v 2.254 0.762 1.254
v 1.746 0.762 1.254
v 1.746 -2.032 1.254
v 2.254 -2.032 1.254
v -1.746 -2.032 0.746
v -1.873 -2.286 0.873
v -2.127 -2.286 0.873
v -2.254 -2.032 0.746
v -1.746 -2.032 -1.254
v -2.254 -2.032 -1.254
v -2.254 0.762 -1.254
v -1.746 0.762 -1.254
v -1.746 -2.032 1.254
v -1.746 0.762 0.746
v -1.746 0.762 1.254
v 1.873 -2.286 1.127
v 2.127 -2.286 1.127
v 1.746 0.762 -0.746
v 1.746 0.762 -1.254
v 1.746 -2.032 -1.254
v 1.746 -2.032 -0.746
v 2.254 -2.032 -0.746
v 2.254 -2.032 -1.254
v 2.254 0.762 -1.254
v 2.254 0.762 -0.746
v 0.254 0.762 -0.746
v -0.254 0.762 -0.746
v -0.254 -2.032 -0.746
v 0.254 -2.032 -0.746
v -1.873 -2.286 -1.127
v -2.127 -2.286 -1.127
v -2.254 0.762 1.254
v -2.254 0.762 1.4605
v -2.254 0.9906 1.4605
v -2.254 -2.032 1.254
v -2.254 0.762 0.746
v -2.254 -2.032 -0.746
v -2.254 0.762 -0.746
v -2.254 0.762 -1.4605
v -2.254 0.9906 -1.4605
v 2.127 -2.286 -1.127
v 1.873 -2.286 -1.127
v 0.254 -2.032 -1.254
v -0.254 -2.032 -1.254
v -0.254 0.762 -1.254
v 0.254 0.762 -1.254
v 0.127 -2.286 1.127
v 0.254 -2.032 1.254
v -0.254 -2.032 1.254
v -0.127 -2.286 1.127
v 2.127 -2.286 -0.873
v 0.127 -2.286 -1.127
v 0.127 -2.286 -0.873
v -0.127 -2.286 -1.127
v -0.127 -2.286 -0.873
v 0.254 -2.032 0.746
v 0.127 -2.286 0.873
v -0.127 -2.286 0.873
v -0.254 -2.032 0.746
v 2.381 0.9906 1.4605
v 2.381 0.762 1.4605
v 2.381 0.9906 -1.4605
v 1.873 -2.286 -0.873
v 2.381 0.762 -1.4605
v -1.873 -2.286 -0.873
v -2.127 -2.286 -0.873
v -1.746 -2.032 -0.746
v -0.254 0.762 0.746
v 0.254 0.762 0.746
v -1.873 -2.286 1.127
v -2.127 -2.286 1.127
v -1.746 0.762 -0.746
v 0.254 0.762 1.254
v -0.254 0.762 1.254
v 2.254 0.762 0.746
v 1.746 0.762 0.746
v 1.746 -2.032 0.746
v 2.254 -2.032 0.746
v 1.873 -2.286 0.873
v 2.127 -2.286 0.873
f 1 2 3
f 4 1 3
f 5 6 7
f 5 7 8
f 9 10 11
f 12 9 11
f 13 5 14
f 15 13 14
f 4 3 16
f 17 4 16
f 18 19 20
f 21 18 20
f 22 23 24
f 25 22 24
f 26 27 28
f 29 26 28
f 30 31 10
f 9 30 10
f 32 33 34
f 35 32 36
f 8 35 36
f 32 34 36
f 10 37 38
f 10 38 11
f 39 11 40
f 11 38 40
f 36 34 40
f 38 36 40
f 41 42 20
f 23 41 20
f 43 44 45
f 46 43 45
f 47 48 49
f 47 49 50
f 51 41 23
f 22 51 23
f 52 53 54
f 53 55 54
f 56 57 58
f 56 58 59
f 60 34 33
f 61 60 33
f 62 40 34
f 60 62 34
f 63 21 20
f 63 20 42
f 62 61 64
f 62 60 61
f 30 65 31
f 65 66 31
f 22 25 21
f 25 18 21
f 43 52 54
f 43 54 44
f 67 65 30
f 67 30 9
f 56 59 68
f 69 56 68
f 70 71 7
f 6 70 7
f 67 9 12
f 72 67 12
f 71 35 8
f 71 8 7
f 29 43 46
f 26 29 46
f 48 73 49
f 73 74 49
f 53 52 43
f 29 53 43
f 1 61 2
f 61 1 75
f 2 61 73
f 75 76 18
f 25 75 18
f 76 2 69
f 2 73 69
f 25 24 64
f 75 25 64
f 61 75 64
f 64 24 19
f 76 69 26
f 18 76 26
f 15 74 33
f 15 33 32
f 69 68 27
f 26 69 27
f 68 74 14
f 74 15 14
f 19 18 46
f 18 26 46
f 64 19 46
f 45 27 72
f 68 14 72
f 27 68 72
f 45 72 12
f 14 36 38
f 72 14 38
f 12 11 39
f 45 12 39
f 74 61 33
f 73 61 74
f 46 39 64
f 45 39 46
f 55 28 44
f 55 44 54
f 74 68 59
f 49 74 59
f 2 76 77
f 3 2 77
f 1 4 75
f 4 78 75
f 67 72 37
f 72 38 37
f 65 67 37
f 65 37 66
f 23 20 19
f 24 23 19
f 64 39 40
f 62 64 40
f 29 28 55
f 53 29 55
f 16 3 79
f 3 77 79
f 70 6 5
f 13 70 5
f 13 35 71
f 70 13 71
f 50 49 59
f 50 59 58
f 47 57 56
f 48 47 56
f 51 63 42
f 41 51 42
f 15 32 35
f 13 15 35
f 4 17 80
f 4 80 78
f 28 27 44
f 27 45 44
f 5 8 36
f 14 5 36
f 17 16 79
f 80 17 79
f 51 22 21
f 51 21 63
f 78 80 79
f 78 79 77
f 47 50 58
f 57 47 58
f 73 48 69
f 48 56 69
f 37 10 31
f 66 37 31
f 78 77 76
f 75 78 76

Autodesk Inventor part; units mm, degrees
sketch "Sketch_2" plane through (-2.254, 0, 0) normal (1, 0, 0) x (0, 0, -1)
  line L0 (-1.4605, 0.762) -> (-1.254, 0.762)
  line L1 (-1.254, 0.762) -> (-1.254, -2.032)
  line L2 (-1.254, -2.032) -> (-1.127, -2.286)
  line L3 (-1.127, -2.286) -> (-0.873, -2.286)
  line L4 (-0.873, -2.286) -> (-0.746, -2.032)
  line L5 (-0.746, -2.032) -> (-0.746, 0.762)
  line L6 (-0.746, 0.762) -> (0.746, 0.762)
  line L7 (0.746, 0.762) -> (0.746, -2.032)
  line L8 (0.746, -2.032) -> (0.873, -2.286)
  line L9 (0.873, -2.286) -> (1.127, -2.286)
  line L10 (1.127, -2.286) -> (1.254, -2.032)
  line L11 (1.254, -2.032) -> (1.254, 0.762)
  line L12 (1.254, 0.762) -> (1.4605, 0.762)
  line L13 (1.4605, 0.762) -> (1.4605, 0.9906)
  line L14 (1.4605, 0.9906) -> (-1.4605, 0.9906)
  line L15 (-1.4605, 0.9906) -> (-1.4605, 0.762)
extrude "Extrusion1" add sketch "Sketch_2" along normal blind 4.635
sketch "Sketch_1" plane through (0, 0, 0) normal (0, 0, 1) x (1, 0, 0)
  line L0 (-109.4334, 38.1) -> (-109.4334, -38.1)
  line L1 (-109.4334, -38.1) -> (56.7986, -38.1)
  line L2 (56.7986, -38.1) -> (56.7986, 38.1)
  line L3 (56.7986, 38.1) -> (-109.4334, 38.1)
  line L4 (-100.4603, 0.762) -> (-100.2538, 0.762)
  line L5 (-100.2538, 0.762) -> (-100.2538, -2.032)
  line L6 (-100.2538, -2.032) -> (-100.1268, -2.286)
  line L7 (-100.1268, -2.286) -> (-99.8728, -2.286)
  line L8 (-99.8728, -2.286) -> (-99.7458, -2.032)
  line L9 (-99.7458, -2.032) -> (-99.7458, 0.762)
  line L10 (-99.7458, 0.762) -> (-98.2538, 0.762)
  line L11 (-98.2538, 0.762) -> (-98.2538, -2.032)
  line L12 (-98.2538, -2.032) -> (-98.1268, -2.286)
  line L13 (-98.1268, -2.286) -> (-97.8728, -2.286)
  line L14 (-97.8728, -2.286) -> (-97.7458, -2.032)
  line L15 (-97.7458, -2.032) -> (-97.7458, 0.762)
  line L16 (-97.7458, 0.762) -> (-96.2538, 0.762)
  line L17 (-96.2538, 0.762) -> (-96.2538, -2.032)
  line L18 (-96.2538, -2.032) -> (-96.1268, -2.286)
  line L19 (-96.1268, -2.286) -> (-95.8728, -2.286)
  line L20 (-95.8728, -2.286) -> (-95.7458, -2.032)
  line L21 (-95.7458, -2.032) -> (-95.7458, 0.762)
  line L22 (-95.7458, 0.762) -> (-94.2538, 0.762)
  line L23 (-94.2538, 0.762) -> (-94.2538, -2.032)
  line L24 (-94.2538, -2.032) -> (-94.1268, -2.286)
  line L25 (-94.1268, -2.286) -> (-93.8728, -2.286)
  line L26 (-93.8728, -2.286) -> (-93.7458, -2.032)
  line L27 (-93.7458, -2.032) -> (-93.7458, 0.762)
  line L28 (-93.7458, 0.762) -> (-92.2538, 0.762)
  line L29 (-92.2538, 0.762) -> (-92.2538, -2.032)
  line L30 (-92.2538, -2.032) -> (-92.1268, -2.286)
  line L31 (-92.1268, -2.286) -> (-91.8728, -2.286)
  line L32 (-91.8728, -2.286) -> (-91.7458, -2.032)
  line L33 (-91.7458, -2.032) -> (-91.7458, 0.762)
  line L34 (-91.7458, 0.762) -> (-90.2538, 0.762)
  line L35 (-90.2538, 0.762) -> (-90.2538, -2.032)
  line L36 (-90.2538, -2.032) -> (-90.1268, -2.286)
  line L37 (-90.1268, -2.286) -> (-89.8728, -2.286)
  line L38 (-89.8728, -2.286) -> (-89.7458, -2.032)
  line L39 (-89.7458, -2.032) -> (-89.7458, 0.762)
  line L40 (-89.7458, 0.762) -> (-88.2538, 0.762)
  line L41 (-88.2538, 0.762) -> (-88.2538, -2.032)
  line L42 (-88.2538, -2.032) -> (-88.1268, -2.286)
  line L43 (-88.1268, -2.286) -> (-87.8728, -2.286)
  line L44 (-87.8728, -2.286) -> (-87.7458, -2.032)
  line L45 (-87.7458, -2.032) -> (-87.7458, 0.762)
  line L46 (-87.7458, 0.762) -> (-86.2538, 0.762)
  line L47 (-86.2538, 0.762) -> (-86.2538, -2.032)
  line L48 (-86.2538, -2.032) -> (-86.1268, -2.286)
  line L49 (-86.1268, -2.286) -> (-85.8728, -2.286)
  line L50 (-85.8728, -2.286) -> (-85.7458, -2.032)
  line L51 (-85.7458, -2.032) -> (-85.7458, 0.762)
  line L52 (-85.7458, 0.762) -> (-84.2538, 0.762)
  line L53 (-84.2538, 0.762) -> (-84.2538, -2.032)
  line L54 (-84.2538, -2.032) -> (-84.1268, -2.286)
  line L55 (-84.1268, -2.286) -> (-83.8728, -2.286)
  line L56 (-83.8728, -2.286) -> (-83.7458, -2.032)
  line L57 (-83.7458, -2.032) -> (-83.7458, 0.762)
  line L58 (-83.7458, 0.762) -> (-82.2538, 0.762)
  line L59 (-82.2538, 0.762) -> (-82.2538, -2.032)
  line L60 (-82.2538, -2.032) -> (-82.1268, -2.286)
  line L61 (-82.1268, -2.286) -> (-81.8728, -2.286)
  line L62 (-81.8728, -2.286) -> (-81.7458, -2.032)
  line L63 (-81.7458, -2.032) -> (-81.7458, 0.762)
  line L64 (-81.7458, 0.762) -> (-80.2538, 0.762)
  line L65 (-80.2538, 0.762) -> (-80.2538, -2.032)
  line L66 (-80.2538, -2.032) -> (-80.1268, -2.286)
  line L67 (-80.1268, -2.286) -> (-79.8728, -2.286)
  line L68 (-79.8728, -2.286) -> (-79.7458, -2.032)
  line L69 (-79.7458, -2.032) -> (-79.7458, 0.762)
  line L70 (-79.7458, 0.762) -> (-78.2538, 0.762)
  line L71 (-78.2538, 0.762) -> (-78.2538, -2.032)
  line L72 (-78.2538, -2.032) -> (-78.1268, -2.286)
  line L73 (-78.1268, -2.286) -> (-77.8728, -2.286)
  line L74 (-77.8728, -2.286) -> (-77.7458, -2.032)
  line L75 (-77.7458, -2.032) -> (-77.7458, 0.762)
  line L76 (-77.7458, 0.762) -> (-76.2538, 0.762)
  line L77 (-76.2538, 0.762) -> (-76.2538, -2.032)
  line L78 (-76.2538, -2.032) -> (-76.1268, -2.286)
  line L79 (-76.1268, -2.286) -> (-75.8728, -2.286)
  line L80 (-75.8728, -2.286) -> (-75.7458, -2.032)
  line L81 (-75.7458, -2.032) -> (-75.7458, 0.762)
  line L82 (-75.7458, 0.762) -> (-74.2539, 0.762)
  line L83 (-74.2539, 0.762) -> (-74.2539, -2.032)
  line L84 (-74.2539, -2.032) -> (-74.1269, -2.286)
  line L85 (-74.1269, -2.286) -> (-73.8729, -2.286)
  line L86 (-73.8729, -2.286) -> (-73.7459, -2.032)
  line L87 (-73.7459, -2.032) -> (-73.7459, 0.762)
  line L88 (-73.7459, 0.762) -> (-72.2539, 0.762)
  line L89 (-72.2539, 0.762) -> (-72.2539, -2.032)
  line L90 (-72.2539, -2.032) -> (-72.1269, -2.286)
  line L91 (-72.1269, -2.286) -> (-71.8729, -2.286)
  line L92 (-71.8729, -2.286) -> (-71.7459, -2.032)
  line L93 (-71.7459, -2.032) -> (-71.7459, 0.762)
  line L94 (-71.7459, 0.762) -> (-70.2539, 0.762)
  line L95 (-70.2539, 0.762) -> (-70.2539, -2.032)
  line L96 (-70.2539, -2.032) -> (-70.1269, -2.286)
  line L97 (-70.1269, -2.286) -> (-69.8729, -2.286)
  line L98 (-69.8729, -2.286) -> (-69.7459, -2.032)
  line L99 (-69.7459, -2.032) -> (-69.7459, 0.762)
  line L100 (-69.7459, 0.762) -> (-68.2539, 0.762)
  line L101 (-68.2539, 0.762) -> (-68.2539, -2.032)
  line L102 (-68.2539, -2.032) -> (-68.1269, -2.286)
  line L103 (-68.1269, -2.286) -> (-67.8729, -2.286)
  line L104 (-67.8729, -2.286) -> (-67.7459, -2.032)
  line L105 (-67.7459, -2.032) -> (-67.7459, 0.762)
  line L106 (-67.7459, 0.762) -> (-66.2539, 0.762)
  line L107 (-66.2539, 0.762) -> (-66.2539, -2.032)
  line L108 (-66.2539, -2.032) -> (-66.1269, -2.286)
  line L109 (-66.1269, -2.286) -> (-65.8729, -2.286)
  line L110 (-65.8729, -2.286) -> (-65.7459, -2.032)
  line L111 (-65.7459, -2.032) -> (-65.7459, 0.762)
  line L112 (-65.7459, 0.762) -> (-64.2539, 0.762)
  line L113 (-64.2539, 0.762) -> (-64.2539, -2.032)
  line L114 (-64.2539, -2.032) -> (-64.1269, -2.286)
  line L115 (-64.1269, -2.286) -> (-63.8729, -2.286)
  line L116 (-63.8729, -2.286) -> (-63.7459, -2.032)
  line L117 (-63.7459, -2.032) -> (-63.7459, 0.762)
  line L118 (-63.7459, 0.762) -> (-62.2539, 0.762)
  line L119 (-62.2539, 0.762) -> (-62.2539, -2.032)
  line L120 (-62.2539, -2.032) -> (-62.1269, -2.286)
  line L121 (-62.1269, -2.286) -> (-61.8729, -2.286)
  line L122 (-61.8729, -2.286) -> (-61.7459, -2.032)
  line L123 (-61.7459, -2.032) -> (-61.7459, 0.762)
  line L124 (-61.7459, 0.762) -> (-60.2539, 0.762)
  line L125 (-60.2539, 0.762) -> (-60.2539, -2.032)
  line L126 (-60.2539, -2.032) -> (-60.1269, -2.286)
  line L127 (-60.1269, -2.286) -> (-59.8729, -2.286)
  line L128 (-59.8729, -2.286) -> (-59.7459, -2.032)
  line L129 (-59.7459, -2.032) -> (-59.7459, 0.762)
  line L130 (-59.7459, 0.762) -> (-58.2539, 0.762)
  line L131 (-58.2539, 0.762) -> (-58.2539, -2.032)
  line L132 (-58.2539, -2.032) -> (-58.1269, -2.286)
  line L133 (-58.1269, -2.286) -> (-57.8729, -2.286)
  line L134 (-57.8729, -2.286) -> (-57.7459, -2.032)
  line L135 (-57.7459, -2.032) -> (-57.7459, 0.762)
  line L136 (-57.7459, 0.762) -> (-56.2539, 0.762)
  line L137 (-56.2539, 0.762) -> (-56.2539, -2.032)
  line L138 (-56.2539, -2.032) -> (-56.1269, -2.286)
  line L139 (-56.1269, -2.286) -> (-55.8729, -2.286)
  line L140 (-55.8729, -2.286) -> (-55.7459, -2.032)
  line L141 (-55.7459, -2.032) -> (-55.7459, 0.762)
  line L142 (-55.7459, 0.762) -> (-54.2539, 0.762)
  line L143 (-54.2539, 0.762) -> (-54.2539, -2.032)
  line L144 (-54.2539, -2.032) -> (-54.1269, -2.286)
  line L145 (-54.1269, -2.286) -> (-53.8729, -2.286)
  line L146 (-53.8729, -2.286) -> (-53.7459, -2.032)
  line L147 (-53.7459, -2.032) -> (-53.7459, 0.762)
  line L148 (-53.7459, 0.762) -> (-52.2539, 0.762)
  line L149 (-52.2539, 0.762) -> (-52.2539, -2.032)
  line L150 (-52.2539, -2.032) -> (-52.1269, -2.286)
  line L151 (-52.1269, -2.286) -> (-51.8729, -2.286)
  line L152 (-51.8729, -2.286) -> (-51.7459, -2.032)
  line L153 (-51.7459, -2.032) -> (-51.7459, 0.762)
  line L154 (-51.7459, 0.762) -> (-50.2539, 0.762)
  line L155 (-50.2539, 0.762) -> (-50.2539, -2.032)
  line L156 (-50.2539, -2.032) -> (-50.1269, -2.286)
  line L157 (-50.1269, -2.286) -> (-49.8729, -2.286)
  line L158 (-49.8729, -2.286) -> (-49.7459, -2.032)
  line L159 (-49.7459, -2.032) -> (-49.7459, 0.762)
  line L160 (-49.7459, 0.762) -> (-48.2539, 0.762)
  line L161 (-48.2539, 0.762) -> (-48.2539, -2.032)
  line L162 (-48.2539, -2.032) -> (-48.1269, -2.286)
  line L163 (-48.1269, -2.286) -> (-47.8729, -2.286)
  line L164 (-47.8729, -2.286) -> (-47.7459, -2.032)
  line L165 (-47.7459, -2.032) -> (-47.7459, 0.762)
  line L166 (-47.7459, 0.762) -> (-46.2539, 0.762)
  line L167 (-46.2539, 0.762) -> (-46.2539, -2.032)
  line L168 (-46.2539, -2.032) -> (-46.1269, -2.286)
  line L169 (-46.1269, -2.286) -> (-45.8729, -2.286)
  line L170 (-45.8729, -2.286) -> (-45.7459, -2.032)
  line L171 (-45.7459, -2.032) -> (-45.7459, 0.762)
  line L172 (-45.7459, 0.762) -> (-44.2539, 0.762)
  line L173 (-44.2539, 0.762) -> (-44.2539, -2.032)
  line L174 (-44.2539, -2.032) -> (-44.1269, -2.286)
  line L175 (-44.1269, -2.286) -> (-43.8729, -2.286)
  line L176 (-43.8729, -2.286) -> (-43.7459, -2.032)
  line L177 (-43.7459, -2.032) -> (-43.7459, 0.762)
  line L178 (-43.7459, 0.762) -> (-42.2539, 0.762)
  line L179 (-42.2539, 0.762) -> (-42.2539, -2.032)
  line L180 (-42.2539, -2.032) -> (-42.1269, -2.286)
  line L181 (-42.1269, -2.286) -> (-41.8729, -2.286)
  line L182 (-41.8729, -2.286) -> (-41.7459, -2.032)
  line L183 (-41.7459, -2.032) -> (-41.7459, 0.762)
  line L184 (-41.7459, 0.762) -> (-40.2539, 0.762)
  line L185 (-40.2539, 0.762) -> (-40.2539, -2.032)
  line L186 (-40.2539, -2.032) -> (-40.1269, -2.286)
  line L187 (-40.1269, -2.286) -> (-39.8729, -2.286)
  line L188 (-39.8729, -2.286) -> (-39.7459, -2.032)
  line L189 (-39.7459, -2.032) -> (-39.7459, 0.762)
  line L190 (-39.7459, 0.762) -> (-38.2539, 0.762)
  line L191 (-38.2539, 0.762) -> (-38.2539, -2.032)
  line L192 (-38.2539, -2.032) -> (-38.1269, -2.286)
  line L193 (-38.1269, -2.286) -> (-37.8729, -2.286)
  line L194 (-37.8729, -2.286) -> (-37.7459, -2.032)
  line L195 (-37.7459, -2.032) -> (-37.7459, 0.762)
  line L196 (-37.7459, 0.762) -> (-36.2539, 0.762)
  line L197 (-36.2539, 0.762) -> (-36.2539, -2.032)
  line L198 (-36.2539, -2.032) -> (-36.1269, -2.286)
  line L199 (-36.1269, -2.286) -> (-35.8729, -2.286)
  line L200 (-35.8729, -2.286) -> (-35.7459, -2.032)
  line L201 (-35.7459, -2.032) -> (-35.7459, 0.762)
  line L202 (-35.7459, 0.762) -> (-34.2539, 0.762)
  line L203 (-34.2539, 0.762) -> (-34.2539, -2.032)
  line L204 (-34.2539, -2.032) -> (-34.1269, -2.286)
  line L205 (-34.1269, -2.286) -> (-33.8729, -2.286)
  line L206 (-33.8729, -2.286) -> (-33.7459, -2.032)
  line L207 (-33.7459, -2.032) -> (-33.7459, 0.762)
  line L208 (-33.7459, 0.762) -> (-32.2539, 0.762)
  line L209 (-32.2539, 0.762) -> (-32.2539, -2.032)
  line L210 (-32.2539, -2.032) -> (-32.1269, -2.286)
  line L211 (-32.1269, -2.286) -> (-31.8729, -2.286)
  line L212 (-31.8729, -2.286) -> (-31.7459, -2.032)
  line L213 (-31.7459, -2.032) -> (-31.7459, 0.762)
  line L214 (-31.7459, 0.762) -> (-30.2539, 0.762)
  line L215 (-30.2539, 0.762) -> (-30.2539, -2.032)
  line L216 (-30.2539, -2.032) -> (-30.1269, -2.286)
  line L217 (-30.1269, -2.286) -> (-29.8729, -2.286)
  line L218 (-29.8729, -2.286) -> (-29.7459, -2.032)
  line L219 (-29.7459, -2.032) -> (-29.7459, 0.762)
  line L220 (-29.7459, 0.762) -> (-28.2539, 0.762)
  line L221 (-28.2539, 0.762) -> (-28.2539, -2.032)
  line L222 (-28.2539, -2.032) -> (-28.1269, -2.286)
  line L223 (-28.1269, -2.286) -> (-27.8729, -2.286)
  line L224 (-27.8729, -2.286) -> (-27.7459, -2.032)
  line L225 (-27.7459, -2.032) -> (-27.7459, 0.762)
  line L226 (-27.7459, 0.762) -> (-26.2539, 0.762)
  line L227 (-26.2539, 0.762) -> (-26.2539, -2.032)
  line L228 (-26.2539, -2.032) -> (-26.1269, -2.286)
  line L229 (-26.1269, -2.286) -> (-25.8729, -2.286)
  line L230 (-25.8729, -2.286) -> (-25.7459, -2.032)
  line L231 (-25.7459, -2.032) -> (-25.7459, 0.762)
  line L232 (-25.7459, 0.762) -> (-24.254, 0.762)
  line L233 (-24.254, 0.762) -> (-24.254, -2.032)
  line L234 (-24.254, -2.032) -> (-24.127, -2.286)
  line L235 (-24.127, -2.286) -> (-23.873, -2.286)
  line L236 (-23.873, -2.286) -> (-23.746, -2.032)
  line L237 (-23.746, -2.032) -> (-23.746, 0.762)
  line L238 (-23.746, 0.762) -> (-22.254, 0.762)
  line L239 (-22.254, 0.762) -> (-22.254, -2.032)
  line L240 (-22.254, -2.032) -> (-22.127, -2.286)
  line L241 (-22.127, -2.286) -> (-21.873, -2.286)
  line L242 (-21.873, -2.286) -> (-21.746, -2.032)
  line L243 (-21.746, -2.032) -> (-21.746, 0.762)
  line L244 (-21.746, 0.762) -> (-20.254, 0.762)
  line L245 (-20.254, 0.762) -> (-20.254, -2.032)
  line L246 (-20.254, -2.032) -> (-20.127, -2.286)
  line L247 (-20.127, -2.286) -> (-19.873, -2.286)
  line L248 (-19.873, -2.286) -> (-19.746, -2.032)
  line L249 (-19.746, -2.032) -> (-19.746, 0.762)
  line L250 (-19.746, 0.762) -> (-18.254, 0.762)
  line L251 (-18.254, 0.762) -> (-18.254, -2.032)
  line L252 (-18.254, -2.032) -> (-18.127, -2.286)
  line L253 (-18.127, -2.286) -> (-17.873, -2.286)
  line L254 (-17.873, -2.286) -> (-17.746, -2.032)
  line L255 (-17.746, -2.032) -> (-17.746, 0.762)
  line L256 (-17.746, 0.762) -> (-16.254, 0.762)
  line L257 (-16.254, 0.762) -> (-16.254, -2.032)
  line L258 (-16.254, -2.032) -> (-16.127, -2.286)
  line L259 (-16.127, -2.286) -> (-15.873, -2.286)
  line L260 (-15.873, -2.286) -> (-15.746, -2.032)
  line L261 (-15.746, -2.032) -> (-15.746, 0.762)
  line L262 (-15.746, 0.762) -> (-14.254, 0.762)
  line L263 (-14.254, 0.762) -> (-14.254, -2.032)
  line L264 (-14.254, -2.032) -> (-14.127, -2.286)
  line L265 (-14.127, -2.286) -> (-13.873, -2.286)
  line L266 (-13.873, -2.286) -> (-13.746, -2.032)
  line L267 (-13.746, -2.032) -> (-13.746, 0.762)
  line L268 (-13.746, 0.762) -> (-12.254, 0.762)
  line L269 (-12.254, 0.762) -> (-12.254, -2.032)
  line L270 (-12.254, -2.032) -> (-12.127, -2.286)
  line L271 (-12.127, -2.286) -> (-11.873, -2.286)
  line L272 (-11.873, -2.286) -> (-11.746, -2.032)
  line L273 (-11.746, -2.032) -> (-11.746, 0.762)
  line L274 (-11.746, 0.762) -> (-10.254, 0.762)
  line L275 (-10.254, 0.762) -> (-10.254, -2.032)
  line L276 (-10.254, -2.032) -> (-10.127, -2.286)
  line L277 (-10.127, -2.286) -> (-9.873, -2.286)
  line L278 (-9.873, -2.286) -> (-9.746, -2.032)
  line L279 (-9.746, -2.032) -> (-9.746, 0.762)
  line L280 (-9.746, 0.762) -> (-8.254, 0.762)
  line L281 (-8.254, 0.762) -> (-8.254, -2.032)
  line L282 (-8.254, -2.032) -> (-8.127, -2.286)
  line L283 (-8.127, -2.286) -> (-7.873, -2.286)
  line L284 (-7.873, -2.286) -> (-7.746, -2.032)
  line L285 (-7.746, -2.032) -> (-7.746, 0.762)
  line L286 (-7.746, 0.762) -> (-6.254, 0.762)
  line L287 (-6.254, 0.762) -> (-6.254, -2.032)
  line L288 (-6.254, -2.032) -> (-6.127, -2.286)
  line L289 (-6.127, -2.286) -> (-5.873, -2.286)
  line L290 (-5.873, -2.286) -> (-5.746, -2.032)
  line L291 (-5.746, -2.032) -> (-5.746, 0.762)
  line L292 (-5.746, 0.762) -> (-4.254, 0.762)
  line L293 (-4.254, 0.762) -> (-4.254, -2.032)
  line L294 (-4.254, -2.032) -> (-4.127, -2.286)
  line L295 (-4.127, -2.286) -> (-3.873, -2.286)
  line L296 (-3.873, -2.286) -> (-3.746, -2.032)
  line L297 (-3.746, -2.032) -> (-3.746, 0.762)
  line L298 (-3.746, 0.762) -> (-2.254, 0.762)
  line L299 (-2.254, 0.762) -> (-2.254, -2.032)
  line L300 (-2.254, -2.032) -> (-2.127, -2.286)
  line L301 (-2.127, -2.286) -> (-1.873, -2.286)
  line L302 (-1.873, -2.286) -> (-1.746, -2.032)
  line L303 (-1.746, -2.032) -> (-1.746, 0.762)
  line L304 (-1.746, 0.762) -> (-0.254, 0.762)
  line L305 (-0.254, 0.762) -> (-0.254, -2.032)
  line L306 (-0.254, -2.032) -> (-0.127, -2.286)
  line L307 (-0.127, -2.286) -> (0.127, -2.286)
  line L308 (0.127, -2.286) -> (0.254, -2.032)
  line L309 (0.254, -2.032) -> (0.254, 0.762)
  line L310 (0.254, 0.762) -> (1.746, 0.762)
  line L311 (1.746, 0.762) -> (1.746, -2.032)
  line L312 (1.746, -2.032) -> (1.873, -2.286)
  line L313 (1.873, -2.286) -> (2.127, -2.286)
  line L314 (2.127, -2.286) -> (2.254, -2.032)
  line L315 (2.254, -2.032) -> (2.254, 0.762)
  line L316 (2.254, 0.762) -> (2.4605, 0.762)
  line L317 (2.4605, 0.762) -> (2.4605, 0.9906)
  line L318 (2.4605, 0.9906) -> (2.254, 0.9906)
  line L319 (2.254, 0.9906) -> (2.254, 5.6642)
  line L320 (2.254, 5.6642) -> (2.127, 5.9182)
  line L321 (2.127, 5.9182) -> (1.873, 5.9182)
  line L322 (1.873, 5.9182) -> (1.746, 5.6642)
  line L323 (1.746, 5.6642) -> (1.746, 0.9906)
  line L324 (1.746, 0.9906) -> (0.254, 0.9906)
  line L325 (0.254, 0.9906) -> (0.254, 5.6642)
  line L326 (0.254, 5.6642) -> (0.127, 5.9182)
  line L327 (0.127, 5.9182) -> (-0.127, 5.9182)
  line L328 (-0.127, 5.9182) -> (-0.254, 5.6642)
  line L329 (-0.254, 5.6642) -> (-0.254, 0.9906)
  line L330 (-0.254, 0.9906) -> (-1.746, 0.9906)
  line L331 (-1.746, 0.9906) -> (-1.746, 5.6642)
  line L332 (-1.746, 5.6642) -> (-1.873, 5.9182)
  line L333 (-1.873, 5.9182) -> (-2.127, 5.9182)
  line L334 (-2.127, 5.9182) -> (-2.254, 5.6642)
  line L335 (-2.254, 5.6642) -> (-2.254, 0.9906)
  line L336 (-2.254, 0.9906) -> (-3.746, 0.9906)
  line L337 (-3.746, 0.9906) -> (-3.746, 5.6642)
  line L338 (-3.746, 5.6642) -> (-3.873, 5.9182)
  line L339 (-3.873, 5.9182) -> (-4.127, 5.9182)
  line L340 (-4.127, 5.9182) -> (-4.254, 5.6642)
  line L341 (-4.254, 5.6642) -> (-4.254, 0.9906)
  line L342 (-4.254, 0.9906) -> (-5.746, 0.9906)
  line L343 (-5.746, 0.9906) -> (-5.746, 5.6642)
  line L344 (-5.746, 5.6642) -> (-5.873, 5.9182)
  line L345 (-5.873, 5.9182) -> (-6.127, 5.9182)
  line L346 (-6.127, 5.9182) -> (-6.254, 5.6642)
  line L347 (-6.254, 5.6642) -> (-6.254, 0.9906)
  line L348 (-6.254, 0.9906) -> (-7.746, 0.9906)
  line L349 (-7.746, 0.9906) -> (-7.746, 5.6642)
  line L350 (-7.746, 5.6642) -> (-7.873, 5.9182)
  line L351 (-7.873, 5.9182) -> (-8.127, 5.9182)
  line L352 (-8.127, 5.9182) -> (-8.254, 5.6642)
  line L353 (-8.254, 5.6642) -> (-8.254, 0.9906)
  line L354 (-8.254, 0.9906) -> (-9.746, 0.9906)
  line L355 (-9.746, 0.9906) -> (-9.746, 5.6642)
  line L356 (-9.746, 5.6642) -> (-9.873, 5.9182)
  line L357 (-9.873, 5.9182) -> (-10.127, 5.9182)
  line L358 (-10.127, 5.9182) -> (-10.254, 5.6642)
  line L359 (-10.254, 5.6642) -> (-10.254, 0.9906)
  line L360 (-10.254, 0.9906) -> (-11.746, 0.9906)
  line L361 (-11.746, 0.9906) -> (-11.746, 5.6642)
  line L362 (-11.746, 5.6642) -> (-11.873, 5.9182)
  line L363 (-11.873, 5.9182) -> (-12.127, 5.9182)
  line L364 (-12.127, 5.9182) -> (-12.254, 5.6642)
  line L365 (-12.254, 5.6642) -> (-12.254, 0.9906)
  line L366 (-12.254, 0.9906) -> (-13.746, 0.9906)
  line L367 (-13.746, 0.9906) -> (-13.746, 5.6642)
  line L368 (-13.746, 5.6642) -> (-13.873, 5.9182)
  line L369 (-13.873, 5.9182) -> (-14.127, 5.9182)
  line L370 (-14.127, 5.9182) -> (-14.254, 5.6642)
  line L371 (-14.254, 5.6642) -> (-14.254, 0.9906)
  line L372 (-14.254, 0.9906) -> (-15.746, 0.9906)
  line L373 (-15.746, 0.9906) -> (-15.746, 5.6642)
  line L374 (-15.746, 5.6642) -> (-15.873, 5.9182)
  line L375 (-15.873, 5.9182) -> (-16.127, 5.9182)
  line L376 (-16.127, 5.9182) -> (-16.254, 5.6642)
  line L377 (-16.254, 5.6642) -> (-16.254, 0.9906)
  line L378 (-16.254, 0.9906) -> (-17.746, 0.9906)
  line L379 (-17.746, 0.9906) -> (-17.746, 5.6642)
  line L380 (-17.746, 5.6642) -> (-17.873, 5.9182)
  line L381 (-17.873, 5.9182) -> (-18.127, 5.9182)
  line L382 (-18.127, 5.9182) -> (-18.254, 5.6642)
  line L383 (-18.254, 5.6642) -> (-18.254, 0.9906)
  line L384 (-18.254, 0.9906) -> (-19.746, 0.9906)
  line L385 (-19.746, 0.9906) -> (-19.746, 5.6642)
  line L386 (-19.746, 5.6642) -> (-19.873, 5.9182)
  line L387 (-19.873, 5.9182) -> (-20.127, 5.9182)
  line L388 (-20.127, 5.9182) -> (-20.254, 5.6642)
  line L389 (-20.254, 5.6642) -> (-20.254, 0.9906)
  line L390 (-20.254, 0.9906) -> (-21.746, 0.9906)
  line L391 (-21.746, 0.9906) -> (-21.746, 5.6642)
  line L392 (-21.746, 5.6642) -> (-21.873, 5.9182)
  line L393 (-21.873, 5.9182) -> (-22.127, 5.9182)
  line L394 (-22.127, 5.9182) -> (-22.254, 5.6642)
  line L395 (-22.254, 5.6642) -> (-22.254, 0.9906)
  line L396 (-22.254, 0.9906) -> (-23.746, 0.9906)
  line L397 (-23.746, 0.9906) -> (-23.746, 5.6642)
  line L398 (-23.746, 5.6642) -> (-23.873, 5.9182)
  line L399 (-23.873, 5.9182) -> (-24.127, 5.9182)
  line L400 (-24.127, 5.9182) -> (-24.254, 5.6642)
  line L401 (-24.254, 5.6642) -> (-24.254, 0.9906)
  line L402 (-24.254, 0.9906) -> (-25.7459, 0.9906)
  line L403 (-25.7459, 0.9906) -> (-25.7459, 5.6642)
  line L404 (-25.7459, 5.6642) -> (-25.8729, 5.9182)
  line L405 (-25.8729, 5.9182) -> (-26.1269, 5.9182)
  line L406 (-26.1269, 5.9182) -> (-26.2539, 5.6642)
  line L407 (-26.2539, 5.6642) -> (-26.2539, 0.9906)
  line L408 (-26.2539, 0.9906) -> (-27.7459, 0.9906)
  line L409 (-27.7459, 0.9906) -> (-27.7459, 5.6642)
  line L410 (-27.7459, 5.6642) -> (-27.8729, 5.9182)
  line L411 (-27.8729, 5.9182) -> (-28.1269, 5.9182)
  line L412 (-28.1269, 5.9182) -> (-28.2539, 5.6642)
  line L413 (-28.2539, 5.6642) -> (-28.2539, 0.9906)
  line L414 (-28.2539, 0.9906) -> (-29.7459, 0.9906)
  line L415 (-29.7459, 0.9906) -> (-29.7459, 5.6642)
  line L416 (-29.7459, 5.6642) -> (-29.8729, 5.9182)
  line L417 (-29.8729, 5.9182) -> (-30.1269, 5.9182)
  line L418 (-30.1269, 5.9182) -> (-30.2539, 5.6642)
  line L419 (-30.2539, 5.6642) -> (-30.2539, 0.9906)
  line L420 (-30.2539, 0.9906) -> (-31.7459, 0.9906)
  line L421 (-31.7459, 0.9906) -> (-31.7459, 5.6642)
  line L422 (-31.7459, 5.6642) -> (-31.8729, 5.9182)
  line L423 (-31.8729, 5.9182) -> (-32.1269, 5.9182)
  line L424 (-32.1269, 5.9182) -> (-32.2539, 5.6642)
  line L425 (-32.2539, 5.6642) -> (-32.2539, 0.9906)
  line L426 (-32.2539, 0.9906) -> (-33.7459, 0.9906)
  line L427 (-33.7459, 0.9906) -> (-33.7459, 5.6642)
  line L428 (-33.7459, 5.6642) -> (-33.8729, 5.9182)
  line L429 (-33.8729, 5.9182) -> (-34.1269, 5.9182)
  line L430 (-34.1269, 5.9182) -> (-34.2539, 5.6642)
  line L431 (-34.2539, 5.6642) -> (-34.2539, 0.9906)
  line L432 (-34.2539, 0.9906) -> (-35.7459, 0.9906)
  line L433 (-35.7459, 0.9906) -> (-35.7459, 5.6642)
  line L434 (-35.7459, 5.6642) -> (-35.8729, 5.9182)
  line L435 (-35.8729, 5.9182) -> (-36.1269, 5.9182)
  line L436 (-36.1269, 5.9182) -> (-36.2539, 5.6642)
  line L437 (-36.2539, 5.6642) -> (-36.2539, 0.9906)
  line L438 (-36.2539, 0.9906) -> (-37.7459, 0.9906)
  line L439 (-37.7459, 0.9906) -> (-37.7459, 5.6642)
  line L440 (-37.7459, 5.6642) -> (-37.8729, 5.9182)
  line L441 (-37.8729, 5.9182) -> (-38.1269, 5.9182)
  line L442 (-38.1269, 5.9182) -> (-38.2539, 5.6642)
  line L443 (-38.2539, 5.6642) -> (-38.2539, 0.9906)
  line L444 (-38.2539, 0.9906) -> (-39.7459, 0.9906)
  line L445 (-39.7459, 0.9906) -> (-39.7459, 5.6642)
  line L446 (-39.7459, 5.6642) -> (-39.8729, 5.9182)
  line L447 (-39.8729, 5.9182) -> (-40.1269, 5.9182)
  line L448 (-40.1269, 5.9182) -> (-40.2539, 5.6642)
  line L449 (-40.2539, 5.6642) -> (-40.2539, 0.9906)
  line L450 (-40.2539, 0.9906) -> (-41.7459, 0.9906)
  line L451 (-41.7459, 0.9906) -> (-41.7459, 5.6642)
  line L452 (-41.7459, 5.6642) -> (-41.8729, 5.9182)
  line L453 (-41.8729, 5.9182) -> (-42.1269, 5.9182)
  line L454 (-42.1269, 5.9182) -> (-42.2539, 5.6642)
  line L455 (-42.2539, 5.6642) -> (-42.2539, 0.9906)
  line L456 (-42.2539, 0.9906) -> (-43.7459, 0.9906)
  line L457 (-43.7459, 0.9906) -> (-43.7459, 5.6642)
  line L458 (-43.7459, 5.6642) -> (-43.8729, 5.9182)
  line L459 (-43.8729, 5.9182) -> (-44.1269, 5.9182)
  line L460 (-44.1269, 5.9182) -> (-44.2539, 5.6642)
  line L461 (-44.2539, 5.6642) -> (-44.2539, 0.9906)
  line L462 (-44.2539, 0.9906) -> (-45.7459, 0.9906)
  line L463 (-45.7459, 0.9906) -> (-45.7459, 5.6642)
  line L464 (-45.7459, 5.6642) -> (-45.8729, 5.9182)
  line L465 (-45.8729, 5.9182) -> (-46.1269, 5.9182)
  line L466 (-46.1269, 5.9182) -> (-46.2539, 5.6642)
  line L467 (-46.2539, 5.6642) -> (-46.2539, 0.9906)
  line L468 (-46.2539, 0.9906) -> (-47.7459, 0.9906)
  line L469 (-47.7459, 0.9906) -> (-47.7459, 5.6642)
  line L470 (-47.7459, 5.6642) -> (-47.8729, 5.9182)
  line L471 (-47.8729, 5.9182) -> (-48.1269, 5.9182)
  line L472 (-48.1269, 5.9182) -> (-48.2539, 5.6642)
  line L473 (-48.2539, 5.6642) -> (-48.2539, 0.9906)
  line L474 (-48.2539, 0.9906) -> (-49.7459, 0.9906)
  line L475 (-49.7459, 0.9906) -> (-49.7459, 5.6642)
  line L476 (-49.7459, 5.6642) -> (-49.8729, 5.9182)
  line L477 (-49.8729, 5.9182) -> (-50.1269, 5.9182)
  line L478 (-50.1269, 5.9182) -> (-50.2539, 5.6642)
  line L479 (-50.2539, 5.6642) -> (-50.2539, 0.9906)
  line L480 (-50.2539, 0.9906) -> (-51.7459, 0.9906)
  line L481 (-51.7459, 0.9906) -> (-51.7459, 5.6642)
  line L482 (-51.7459, 5.6642) -> (-51.8729, 5.9182)
  line L483 (-51.8729, 5.9182) -> (-52.1269, 5.9182)
  line L484 (-52.1269, 5.9182) -> (-52.2539, 5.6642)
  line L485 (-52.2539, 5.6642) -> (-52.2539, 0.9906)
  line L486 (-52.2539, 0.9906) -> (-53.7459, 0.9906)
  line L487 (-53.7459, 0.9906) -> (-53.7459, 5.6642)
  line L488 (-53.7459, 5.6642) -> (-53.8729, 5.9182)
  line L489 (-53.8729, 5.9182) -> (-54.1269, 5.9182)
  line L490 (-54.1269, 5.9182) -> (-54.2539, 5.6642)
  line L491 (-54.2539, 5.6642) -> (-54.2539, 0.9906)
  line L492 (-54.2539, 0.9906) -> (-55.7459, 0.9906)
  line L493 (-55.7459, 0.9906) -> (-55.7459, 5.6642)
  line L494 (-55.7459, 5.6642) -> (-55.8729, 5.9182)
  line L495 (-55.8729, 5.9182) -> (-56.1269, 5.9182)
  line L496 (-56.1269, 5.9182) -> (-56.2539, 5.6642)
  line L497 (-56.2539, 5.6642) -> (-56.2539, 0.9906)
  line L498 (-56.2539, 0.9906) -> (-57.7459, 0.9906)
  line L499 (-57.7459, 0.9906) -> (-57.7459, 5.6642)
  line L500 (-57.7459, 5.6642) -> (-57.8729, 5.9182)
  line L501 (-57.8729, 5.9182) -> (-58.1269, 5.9182)
  line L502 (-58.1269, 5.9182) -> (-58.2539, 5.6642)
  line L503 (-58.2539, 5.6642) -> (-58.2539, 0.9906)
  line L504 (-58.2539, 0.9906) -> (-59.7459, 0.9906)
  line L505 (-59.7459, 0.9906) -> (-59.7459, 5.6642)
  line L506 (-59.7459, 5.6642) -> (-59.8729, 5.9182)
  line L507 (-59.8729, 5.9182) -> (-60.1269, 5.9182)
  line L508 (-60.1269, 5.9182) -> (-60.2539, 5.6642)
  line L509 (-60.2539, 5.6642) -> (-60.2539, 0.9906)
  line L510 (-60.2539, 0.9906) -> (-61.7459, 0.9906)
  line L511 (-61.7459, 0.9906) -> (-61.7459, 5.6642)
  line L512 (-61.7459, 5.6642) -> (-61.8729, 5.9182)
  line L513 (-61.8729, 5.9182) -> (-62.1269, 5.9182)
  line L514 (-62.1269, 5.9182) -> (-62.2539, 5.6642)
  line L515 (-62.2539, 5.6642) -> (-62.2539, 0.9906)
  line L516 (-62.2539, 0.9906) -> (-63.7459, 0.9906)
  line L517 (-63.7459, 0.9906) -> (-63.7459, 5.6642)
  line L518 (-63.7459, 5.6642) -> (-63.8729, 5.9182)
  line L519 (-63.8729, 5.9182) -> (-64.1269, 5.9182)
  line L520 (-64.1269, 5.9182) -> (-64.2539, 5.6642)
  line L521 (-64.2539, 5.6642) -> (-64.2539, 0.9906)
  line L522 (-64.2539, 0.9906) -> (-65.7459, 0.9906)
  line L523 (-65.7459, 0.9906) -> (-65.7459, 5.6642)
  line L524 (-65.7459, 5.6642) -> (-65.8729, 5.9182)
  line L525 (-65.8729, 5.9182) -> (-66.1269, 5.9182)
  line L526 (-66.1269, 5.9182) -> (-66.2539, 5.6642)
  line L527 (-66.2539, 5.6642) -> (-66.2539, 0.9906)
  line L528 (-66.2539, 0.9906) -> (-67.7459, 0.9906)
  line L529 (-67.7459, 0.9906) -> (-67.7459, 5.6642)
  line L530 (-67.7459, 5.6642) -> (-67.8729, 5.9182)
  line L531 (-67.8729, 5.9182) -> (-68.1269, 5.9182)
  line L532 (-68.1269, 5.9182) -> (-68.2539, 5.6642)
  line L533 (-68.2539, 5.6642) -> (-68.2539, 0.9906)
  line L534 (-68.2539, 0.9906) -> (-69.7459, 0.9906)
  line L535 (-69.7459, 0.9906) -> (-69.7459, 5.6642)
  line L536 (-69.7459, 5.6642) -> (-69.8729, 5.9182)
  line L537 (-69.8729, 5.9182) -> (-70.1269, 5.9182)
  line L538 (-70.1269, 5.9182) -> (-70.2539, 5.6642)
  line L539 (-70.2539, 5.6642) -> (-70.2539, 0.9906)
  line L540 (-70.2539, 0.9906) -> (-71.7459, 0.9906)
  line L541 (-71.7459, 0.9906) -> (-71.7459, 5.6642)
  line L542 (-71.7459, 5.6642) -> (-71.8729, 5.9182)
  line L543 (-71.8729, 5.9182) -> (-72.1269, 5.9182)
  line L544 (-72.1269, 5.9182) -> (-72.2539, 5.6642)
  line L545 (-72.2539, 5.6642) -> (-72.2539, 0.9906)
  line L546 (-72.2539, 0.9906) -> (-73.7459, 0.9906)
  line L547 (-73.7459, 0.9906) -> (-73.7459, 5.6642)
  line L548 (-73.7459, 5.6642) -> (-73.8729, 5.9182)
  line L549 (-73.8729, 5.9182) -> (-74.1269, 5.9182)
  line L550 (-74.1269, 5.9182) -> (-74.2539, 5.6642)
  line L551 (-74.2539, 5.6642) -> (-74.2539, 0.9906)
  line L552 (-74.2539, 0.9906) -> (-75.7458, 0.9906)
  line L553 (-75.7458, 0.9906) -> (-75.7458, 5.6642)
  line L554 (-75.7458, 5.6642) -> (-75.8728, 5.9182)
  line L555 (-75.8728, 5.9182) -> (-76.1268, 5.9182)
  line L556 (-76.1268, 5.9182) -> (-76.2538, 5.6642)
  line L557 (-76.2538, 5.6642) -> (-76.2538, 0.9906)
  line L558 (-76.2538, 0.9906) -> (-77.7458, 0.9906)
  line L559 (-77.7458, 0.9906) -> (-77.7458, 5.6642)
  line L560 (-77.7458, 5.6642) -> (-77.8728, 5.9182)
  line L561 (-77.8728, 5.9182) -> (-78.1268, 5.9182)
  line L562 (-78.1268, 5.9182) -> (-78.2538, 5.6642)
  line L563 (-78.2538, 5.6642) -> (-78.2538, 0.9906)
  line L564 (-78.2538, 0.9906) -> (-79.7458, 0.9906)
  line L565 (-79.7458, 0.9906) -> (-79.7458, 5.6642)
  line L566 (-79.7458, 5.6642) -> (-79.8728, 5.9182)
  line L567 (-79.8728, 5.9182) -> (-80.1268, 5.9182)
  line L568 (-80.1268, 5.9182) -> (-80.2538, 5.6642)
  line L569 (-80.2538, 5.6642) -> (-80.2538, 0.9906)
  line L570 (-80.2538, 0.9906) -> (-81.7458, 0.9906)
  line L571 (-81.7458, 0.9906) -> (-81.7458, 5.6642)
  line L572 (-81.7458, 5.6642) -> (-81.8728, 5.9182)
  line L573 (-81.8728, 5.9182) -> (-82.1268, 5.9182)
  line L574 (-82.1268, 5.9182) -> (-82.2538, 5.6642)
  line L575 (-82.2538, 5.6642) -> (-82.2538, 0.9906)
  line L576 (-82.2538, 0.9906) -> (-83.7458, 0.9906)
  line L577 (-83.7458, 0.9906) -> (-83.7458, 5.6642)
  line L578 (-83.7458, 5.6642) -> (-83.8728, 5.9182)
  line L579 (-83.8728, 5.9182) -> (-84.1268, 5.9182)
  line L580 (-84.1268, 5.9182) -> (-84.2538, 5.6642)
  line L581 (-84.2538, 5.6642) -> (-84.2538, 0.9906)
  line L582 (-84.2538, 0.9906) -> (-85.7458, 0.9906)
  line L583 (-85.7458, 0.9906) -> (-85.7458, 5.6642)
  line L584 (-85.7458, 5.6642) -> (-85.8728, 5.9182)
  line L585 (-85.8728, 5.9182) -> (-86.1268, 5.9182)
  line L586 (-86.1268, 5.9182) -> (-86.2538, 5.6642)
  line L587 (-86.2538, 5.6642) -> (-86.2538, 0.9906)
  line L588 (-86.2538, 0.9906) -> (-87.7458, 0.9906)
  line L589 (-87.7458, 0.9906) -> (-87.7458, 5.6642)
  line L590 (-87.7458, 5.6642) -> (-87.8728, 5.9182)
  line L591 (-87.8728, 5.9182) -> (-88.1268, 5.9182)
  line L592 (-88.1268, 5.9182) -> (-88.2538, 5.6642)
  line L593 (-88.2538, 5.6642) -> (-88.2538, 0.9906)
  line L594 (-88.2538, 0.9906) -> (-89.7458, 0.9906)
  line L595 (-89.7458, 0.9906) -> (-89.7458, 5.6642)
  line L596 (-89.7458, 5.6642) -> (-89.8728, 5.9182)
  line L597 (-89.8728, 5.9182) -> (-90.1268, 5.9182)
  line L598 (-90.1268, 5.9182) -> (-90.2538, 5.6642)
  line L599 (-90.2538, 5.6642) -> (-90.2538, 0.9906)
  line L600 (-90.2538, 0.9906) -> (-91.7458, 0.9906)
  line L601 (-91.7458, 0.9906) -> (-91.7458, 5.6642)
  line L602 (-91.7458, 5.6642) -> (-91.8728, 5.9182)
  line L603 (-91.8728, 5.9182) -> (-92.1268, 5.9182)
  line L604 (-92.1268, 5.9182) -> (-92.2538, 5.6642)
  line L605 (-92.2538, 5.6642) -> (-92.2538, 0.9906)
  line L606 (-92.2538, 0.9906) -> (-93.7458, 0.9906)
  line L607 (-93.7458, 0.9906) -> (-93.7458, 5.6642)
  line L608 (-93.7458, 5.6642) -> (-93.8728, 5.9182)
  line L609 (-93.8728, 5.9182) -> (-94.1268, 5.9182)
  line L610 (-94.1268, 5.9182) -> (-94.2538, 5.6642)
  line L611 (-94.2538, 5.6642) -> (-94.2538, 0.9906)
  line L612 (-94.2538, 0.9906) -> (-95.7458, 0.9906)
  line L613 (-95.7458, 0.9906) -> (-95.7458, 5.6642)
  line L614 (-95.7458, 5.6642) -> (-95.8728, 5.9182)
  line L615 (-95.8728, 5.9182) -> (-96.1268, 5.9182)
  line L616 (-96.1268, 5.9182) -> (-96.2538, 5.6642)
  line L617 (-96.2538, 5.6642) -> (-96.2538, 0.9906)
  line L618 (-96.2538, 0.9906) -> (-97.7458, 0.9906)
  line L619 (-97.7458, 0.9906) -> (-97.7458, 5.6642)
  line L620 (-97.7458, 5.6642) -> (-97.8728, 5.9182)
  line L621 (-97.8728, 5.9182) -> (-98.1268, 5.9182)
  line L622 (-98.1268, 5.9182) -> (-98.2538, 5.6642)
  line L623 (-98.2538, 5.6642) -> (-98.2538, 0.9906)
  line L624 (-98.2538, 0.9906) -> (-99.7458, 0.9906)
  line L625 (-99.7458, 0.9906) -> (-99.7458, 5.6642)
  line L626 (-99.7458, 5.6642) -> (-99.8728, 5.9182)
  line L627 (-99.8728, 5.9182) -> (-100.1268, 5.9182)
  line L628 (-100.1268, 5.9182) -> (-100.2538, 5.6642)
  line L629 (-100.2538, 5.6642) -> (-100.2538, 0.9906)
  line L630 (-100.2538, 0.9906) -> (-100.4603, 0.9906)
  line L631 (-100.4603, 0.9906) -> (-100.4603, 0.762)
extrude "Extrusion2" cut sketch "Sketch_1" along normal mid plane 15.24
ref_plane "0_XY" through (0, 0, 0) normal (0, 1, 0) x (1, 0, 0)
ref_plane "0_YZ" through (0, 0, 0) normal (1, 0, 0) x (0, 0, -1)
ref_plane "0_ZX" through (0, 0, 0) normal (0, 0, -1) x (0, 1, 0)
properties part number "TMM-103-05-F-D_pins2"
